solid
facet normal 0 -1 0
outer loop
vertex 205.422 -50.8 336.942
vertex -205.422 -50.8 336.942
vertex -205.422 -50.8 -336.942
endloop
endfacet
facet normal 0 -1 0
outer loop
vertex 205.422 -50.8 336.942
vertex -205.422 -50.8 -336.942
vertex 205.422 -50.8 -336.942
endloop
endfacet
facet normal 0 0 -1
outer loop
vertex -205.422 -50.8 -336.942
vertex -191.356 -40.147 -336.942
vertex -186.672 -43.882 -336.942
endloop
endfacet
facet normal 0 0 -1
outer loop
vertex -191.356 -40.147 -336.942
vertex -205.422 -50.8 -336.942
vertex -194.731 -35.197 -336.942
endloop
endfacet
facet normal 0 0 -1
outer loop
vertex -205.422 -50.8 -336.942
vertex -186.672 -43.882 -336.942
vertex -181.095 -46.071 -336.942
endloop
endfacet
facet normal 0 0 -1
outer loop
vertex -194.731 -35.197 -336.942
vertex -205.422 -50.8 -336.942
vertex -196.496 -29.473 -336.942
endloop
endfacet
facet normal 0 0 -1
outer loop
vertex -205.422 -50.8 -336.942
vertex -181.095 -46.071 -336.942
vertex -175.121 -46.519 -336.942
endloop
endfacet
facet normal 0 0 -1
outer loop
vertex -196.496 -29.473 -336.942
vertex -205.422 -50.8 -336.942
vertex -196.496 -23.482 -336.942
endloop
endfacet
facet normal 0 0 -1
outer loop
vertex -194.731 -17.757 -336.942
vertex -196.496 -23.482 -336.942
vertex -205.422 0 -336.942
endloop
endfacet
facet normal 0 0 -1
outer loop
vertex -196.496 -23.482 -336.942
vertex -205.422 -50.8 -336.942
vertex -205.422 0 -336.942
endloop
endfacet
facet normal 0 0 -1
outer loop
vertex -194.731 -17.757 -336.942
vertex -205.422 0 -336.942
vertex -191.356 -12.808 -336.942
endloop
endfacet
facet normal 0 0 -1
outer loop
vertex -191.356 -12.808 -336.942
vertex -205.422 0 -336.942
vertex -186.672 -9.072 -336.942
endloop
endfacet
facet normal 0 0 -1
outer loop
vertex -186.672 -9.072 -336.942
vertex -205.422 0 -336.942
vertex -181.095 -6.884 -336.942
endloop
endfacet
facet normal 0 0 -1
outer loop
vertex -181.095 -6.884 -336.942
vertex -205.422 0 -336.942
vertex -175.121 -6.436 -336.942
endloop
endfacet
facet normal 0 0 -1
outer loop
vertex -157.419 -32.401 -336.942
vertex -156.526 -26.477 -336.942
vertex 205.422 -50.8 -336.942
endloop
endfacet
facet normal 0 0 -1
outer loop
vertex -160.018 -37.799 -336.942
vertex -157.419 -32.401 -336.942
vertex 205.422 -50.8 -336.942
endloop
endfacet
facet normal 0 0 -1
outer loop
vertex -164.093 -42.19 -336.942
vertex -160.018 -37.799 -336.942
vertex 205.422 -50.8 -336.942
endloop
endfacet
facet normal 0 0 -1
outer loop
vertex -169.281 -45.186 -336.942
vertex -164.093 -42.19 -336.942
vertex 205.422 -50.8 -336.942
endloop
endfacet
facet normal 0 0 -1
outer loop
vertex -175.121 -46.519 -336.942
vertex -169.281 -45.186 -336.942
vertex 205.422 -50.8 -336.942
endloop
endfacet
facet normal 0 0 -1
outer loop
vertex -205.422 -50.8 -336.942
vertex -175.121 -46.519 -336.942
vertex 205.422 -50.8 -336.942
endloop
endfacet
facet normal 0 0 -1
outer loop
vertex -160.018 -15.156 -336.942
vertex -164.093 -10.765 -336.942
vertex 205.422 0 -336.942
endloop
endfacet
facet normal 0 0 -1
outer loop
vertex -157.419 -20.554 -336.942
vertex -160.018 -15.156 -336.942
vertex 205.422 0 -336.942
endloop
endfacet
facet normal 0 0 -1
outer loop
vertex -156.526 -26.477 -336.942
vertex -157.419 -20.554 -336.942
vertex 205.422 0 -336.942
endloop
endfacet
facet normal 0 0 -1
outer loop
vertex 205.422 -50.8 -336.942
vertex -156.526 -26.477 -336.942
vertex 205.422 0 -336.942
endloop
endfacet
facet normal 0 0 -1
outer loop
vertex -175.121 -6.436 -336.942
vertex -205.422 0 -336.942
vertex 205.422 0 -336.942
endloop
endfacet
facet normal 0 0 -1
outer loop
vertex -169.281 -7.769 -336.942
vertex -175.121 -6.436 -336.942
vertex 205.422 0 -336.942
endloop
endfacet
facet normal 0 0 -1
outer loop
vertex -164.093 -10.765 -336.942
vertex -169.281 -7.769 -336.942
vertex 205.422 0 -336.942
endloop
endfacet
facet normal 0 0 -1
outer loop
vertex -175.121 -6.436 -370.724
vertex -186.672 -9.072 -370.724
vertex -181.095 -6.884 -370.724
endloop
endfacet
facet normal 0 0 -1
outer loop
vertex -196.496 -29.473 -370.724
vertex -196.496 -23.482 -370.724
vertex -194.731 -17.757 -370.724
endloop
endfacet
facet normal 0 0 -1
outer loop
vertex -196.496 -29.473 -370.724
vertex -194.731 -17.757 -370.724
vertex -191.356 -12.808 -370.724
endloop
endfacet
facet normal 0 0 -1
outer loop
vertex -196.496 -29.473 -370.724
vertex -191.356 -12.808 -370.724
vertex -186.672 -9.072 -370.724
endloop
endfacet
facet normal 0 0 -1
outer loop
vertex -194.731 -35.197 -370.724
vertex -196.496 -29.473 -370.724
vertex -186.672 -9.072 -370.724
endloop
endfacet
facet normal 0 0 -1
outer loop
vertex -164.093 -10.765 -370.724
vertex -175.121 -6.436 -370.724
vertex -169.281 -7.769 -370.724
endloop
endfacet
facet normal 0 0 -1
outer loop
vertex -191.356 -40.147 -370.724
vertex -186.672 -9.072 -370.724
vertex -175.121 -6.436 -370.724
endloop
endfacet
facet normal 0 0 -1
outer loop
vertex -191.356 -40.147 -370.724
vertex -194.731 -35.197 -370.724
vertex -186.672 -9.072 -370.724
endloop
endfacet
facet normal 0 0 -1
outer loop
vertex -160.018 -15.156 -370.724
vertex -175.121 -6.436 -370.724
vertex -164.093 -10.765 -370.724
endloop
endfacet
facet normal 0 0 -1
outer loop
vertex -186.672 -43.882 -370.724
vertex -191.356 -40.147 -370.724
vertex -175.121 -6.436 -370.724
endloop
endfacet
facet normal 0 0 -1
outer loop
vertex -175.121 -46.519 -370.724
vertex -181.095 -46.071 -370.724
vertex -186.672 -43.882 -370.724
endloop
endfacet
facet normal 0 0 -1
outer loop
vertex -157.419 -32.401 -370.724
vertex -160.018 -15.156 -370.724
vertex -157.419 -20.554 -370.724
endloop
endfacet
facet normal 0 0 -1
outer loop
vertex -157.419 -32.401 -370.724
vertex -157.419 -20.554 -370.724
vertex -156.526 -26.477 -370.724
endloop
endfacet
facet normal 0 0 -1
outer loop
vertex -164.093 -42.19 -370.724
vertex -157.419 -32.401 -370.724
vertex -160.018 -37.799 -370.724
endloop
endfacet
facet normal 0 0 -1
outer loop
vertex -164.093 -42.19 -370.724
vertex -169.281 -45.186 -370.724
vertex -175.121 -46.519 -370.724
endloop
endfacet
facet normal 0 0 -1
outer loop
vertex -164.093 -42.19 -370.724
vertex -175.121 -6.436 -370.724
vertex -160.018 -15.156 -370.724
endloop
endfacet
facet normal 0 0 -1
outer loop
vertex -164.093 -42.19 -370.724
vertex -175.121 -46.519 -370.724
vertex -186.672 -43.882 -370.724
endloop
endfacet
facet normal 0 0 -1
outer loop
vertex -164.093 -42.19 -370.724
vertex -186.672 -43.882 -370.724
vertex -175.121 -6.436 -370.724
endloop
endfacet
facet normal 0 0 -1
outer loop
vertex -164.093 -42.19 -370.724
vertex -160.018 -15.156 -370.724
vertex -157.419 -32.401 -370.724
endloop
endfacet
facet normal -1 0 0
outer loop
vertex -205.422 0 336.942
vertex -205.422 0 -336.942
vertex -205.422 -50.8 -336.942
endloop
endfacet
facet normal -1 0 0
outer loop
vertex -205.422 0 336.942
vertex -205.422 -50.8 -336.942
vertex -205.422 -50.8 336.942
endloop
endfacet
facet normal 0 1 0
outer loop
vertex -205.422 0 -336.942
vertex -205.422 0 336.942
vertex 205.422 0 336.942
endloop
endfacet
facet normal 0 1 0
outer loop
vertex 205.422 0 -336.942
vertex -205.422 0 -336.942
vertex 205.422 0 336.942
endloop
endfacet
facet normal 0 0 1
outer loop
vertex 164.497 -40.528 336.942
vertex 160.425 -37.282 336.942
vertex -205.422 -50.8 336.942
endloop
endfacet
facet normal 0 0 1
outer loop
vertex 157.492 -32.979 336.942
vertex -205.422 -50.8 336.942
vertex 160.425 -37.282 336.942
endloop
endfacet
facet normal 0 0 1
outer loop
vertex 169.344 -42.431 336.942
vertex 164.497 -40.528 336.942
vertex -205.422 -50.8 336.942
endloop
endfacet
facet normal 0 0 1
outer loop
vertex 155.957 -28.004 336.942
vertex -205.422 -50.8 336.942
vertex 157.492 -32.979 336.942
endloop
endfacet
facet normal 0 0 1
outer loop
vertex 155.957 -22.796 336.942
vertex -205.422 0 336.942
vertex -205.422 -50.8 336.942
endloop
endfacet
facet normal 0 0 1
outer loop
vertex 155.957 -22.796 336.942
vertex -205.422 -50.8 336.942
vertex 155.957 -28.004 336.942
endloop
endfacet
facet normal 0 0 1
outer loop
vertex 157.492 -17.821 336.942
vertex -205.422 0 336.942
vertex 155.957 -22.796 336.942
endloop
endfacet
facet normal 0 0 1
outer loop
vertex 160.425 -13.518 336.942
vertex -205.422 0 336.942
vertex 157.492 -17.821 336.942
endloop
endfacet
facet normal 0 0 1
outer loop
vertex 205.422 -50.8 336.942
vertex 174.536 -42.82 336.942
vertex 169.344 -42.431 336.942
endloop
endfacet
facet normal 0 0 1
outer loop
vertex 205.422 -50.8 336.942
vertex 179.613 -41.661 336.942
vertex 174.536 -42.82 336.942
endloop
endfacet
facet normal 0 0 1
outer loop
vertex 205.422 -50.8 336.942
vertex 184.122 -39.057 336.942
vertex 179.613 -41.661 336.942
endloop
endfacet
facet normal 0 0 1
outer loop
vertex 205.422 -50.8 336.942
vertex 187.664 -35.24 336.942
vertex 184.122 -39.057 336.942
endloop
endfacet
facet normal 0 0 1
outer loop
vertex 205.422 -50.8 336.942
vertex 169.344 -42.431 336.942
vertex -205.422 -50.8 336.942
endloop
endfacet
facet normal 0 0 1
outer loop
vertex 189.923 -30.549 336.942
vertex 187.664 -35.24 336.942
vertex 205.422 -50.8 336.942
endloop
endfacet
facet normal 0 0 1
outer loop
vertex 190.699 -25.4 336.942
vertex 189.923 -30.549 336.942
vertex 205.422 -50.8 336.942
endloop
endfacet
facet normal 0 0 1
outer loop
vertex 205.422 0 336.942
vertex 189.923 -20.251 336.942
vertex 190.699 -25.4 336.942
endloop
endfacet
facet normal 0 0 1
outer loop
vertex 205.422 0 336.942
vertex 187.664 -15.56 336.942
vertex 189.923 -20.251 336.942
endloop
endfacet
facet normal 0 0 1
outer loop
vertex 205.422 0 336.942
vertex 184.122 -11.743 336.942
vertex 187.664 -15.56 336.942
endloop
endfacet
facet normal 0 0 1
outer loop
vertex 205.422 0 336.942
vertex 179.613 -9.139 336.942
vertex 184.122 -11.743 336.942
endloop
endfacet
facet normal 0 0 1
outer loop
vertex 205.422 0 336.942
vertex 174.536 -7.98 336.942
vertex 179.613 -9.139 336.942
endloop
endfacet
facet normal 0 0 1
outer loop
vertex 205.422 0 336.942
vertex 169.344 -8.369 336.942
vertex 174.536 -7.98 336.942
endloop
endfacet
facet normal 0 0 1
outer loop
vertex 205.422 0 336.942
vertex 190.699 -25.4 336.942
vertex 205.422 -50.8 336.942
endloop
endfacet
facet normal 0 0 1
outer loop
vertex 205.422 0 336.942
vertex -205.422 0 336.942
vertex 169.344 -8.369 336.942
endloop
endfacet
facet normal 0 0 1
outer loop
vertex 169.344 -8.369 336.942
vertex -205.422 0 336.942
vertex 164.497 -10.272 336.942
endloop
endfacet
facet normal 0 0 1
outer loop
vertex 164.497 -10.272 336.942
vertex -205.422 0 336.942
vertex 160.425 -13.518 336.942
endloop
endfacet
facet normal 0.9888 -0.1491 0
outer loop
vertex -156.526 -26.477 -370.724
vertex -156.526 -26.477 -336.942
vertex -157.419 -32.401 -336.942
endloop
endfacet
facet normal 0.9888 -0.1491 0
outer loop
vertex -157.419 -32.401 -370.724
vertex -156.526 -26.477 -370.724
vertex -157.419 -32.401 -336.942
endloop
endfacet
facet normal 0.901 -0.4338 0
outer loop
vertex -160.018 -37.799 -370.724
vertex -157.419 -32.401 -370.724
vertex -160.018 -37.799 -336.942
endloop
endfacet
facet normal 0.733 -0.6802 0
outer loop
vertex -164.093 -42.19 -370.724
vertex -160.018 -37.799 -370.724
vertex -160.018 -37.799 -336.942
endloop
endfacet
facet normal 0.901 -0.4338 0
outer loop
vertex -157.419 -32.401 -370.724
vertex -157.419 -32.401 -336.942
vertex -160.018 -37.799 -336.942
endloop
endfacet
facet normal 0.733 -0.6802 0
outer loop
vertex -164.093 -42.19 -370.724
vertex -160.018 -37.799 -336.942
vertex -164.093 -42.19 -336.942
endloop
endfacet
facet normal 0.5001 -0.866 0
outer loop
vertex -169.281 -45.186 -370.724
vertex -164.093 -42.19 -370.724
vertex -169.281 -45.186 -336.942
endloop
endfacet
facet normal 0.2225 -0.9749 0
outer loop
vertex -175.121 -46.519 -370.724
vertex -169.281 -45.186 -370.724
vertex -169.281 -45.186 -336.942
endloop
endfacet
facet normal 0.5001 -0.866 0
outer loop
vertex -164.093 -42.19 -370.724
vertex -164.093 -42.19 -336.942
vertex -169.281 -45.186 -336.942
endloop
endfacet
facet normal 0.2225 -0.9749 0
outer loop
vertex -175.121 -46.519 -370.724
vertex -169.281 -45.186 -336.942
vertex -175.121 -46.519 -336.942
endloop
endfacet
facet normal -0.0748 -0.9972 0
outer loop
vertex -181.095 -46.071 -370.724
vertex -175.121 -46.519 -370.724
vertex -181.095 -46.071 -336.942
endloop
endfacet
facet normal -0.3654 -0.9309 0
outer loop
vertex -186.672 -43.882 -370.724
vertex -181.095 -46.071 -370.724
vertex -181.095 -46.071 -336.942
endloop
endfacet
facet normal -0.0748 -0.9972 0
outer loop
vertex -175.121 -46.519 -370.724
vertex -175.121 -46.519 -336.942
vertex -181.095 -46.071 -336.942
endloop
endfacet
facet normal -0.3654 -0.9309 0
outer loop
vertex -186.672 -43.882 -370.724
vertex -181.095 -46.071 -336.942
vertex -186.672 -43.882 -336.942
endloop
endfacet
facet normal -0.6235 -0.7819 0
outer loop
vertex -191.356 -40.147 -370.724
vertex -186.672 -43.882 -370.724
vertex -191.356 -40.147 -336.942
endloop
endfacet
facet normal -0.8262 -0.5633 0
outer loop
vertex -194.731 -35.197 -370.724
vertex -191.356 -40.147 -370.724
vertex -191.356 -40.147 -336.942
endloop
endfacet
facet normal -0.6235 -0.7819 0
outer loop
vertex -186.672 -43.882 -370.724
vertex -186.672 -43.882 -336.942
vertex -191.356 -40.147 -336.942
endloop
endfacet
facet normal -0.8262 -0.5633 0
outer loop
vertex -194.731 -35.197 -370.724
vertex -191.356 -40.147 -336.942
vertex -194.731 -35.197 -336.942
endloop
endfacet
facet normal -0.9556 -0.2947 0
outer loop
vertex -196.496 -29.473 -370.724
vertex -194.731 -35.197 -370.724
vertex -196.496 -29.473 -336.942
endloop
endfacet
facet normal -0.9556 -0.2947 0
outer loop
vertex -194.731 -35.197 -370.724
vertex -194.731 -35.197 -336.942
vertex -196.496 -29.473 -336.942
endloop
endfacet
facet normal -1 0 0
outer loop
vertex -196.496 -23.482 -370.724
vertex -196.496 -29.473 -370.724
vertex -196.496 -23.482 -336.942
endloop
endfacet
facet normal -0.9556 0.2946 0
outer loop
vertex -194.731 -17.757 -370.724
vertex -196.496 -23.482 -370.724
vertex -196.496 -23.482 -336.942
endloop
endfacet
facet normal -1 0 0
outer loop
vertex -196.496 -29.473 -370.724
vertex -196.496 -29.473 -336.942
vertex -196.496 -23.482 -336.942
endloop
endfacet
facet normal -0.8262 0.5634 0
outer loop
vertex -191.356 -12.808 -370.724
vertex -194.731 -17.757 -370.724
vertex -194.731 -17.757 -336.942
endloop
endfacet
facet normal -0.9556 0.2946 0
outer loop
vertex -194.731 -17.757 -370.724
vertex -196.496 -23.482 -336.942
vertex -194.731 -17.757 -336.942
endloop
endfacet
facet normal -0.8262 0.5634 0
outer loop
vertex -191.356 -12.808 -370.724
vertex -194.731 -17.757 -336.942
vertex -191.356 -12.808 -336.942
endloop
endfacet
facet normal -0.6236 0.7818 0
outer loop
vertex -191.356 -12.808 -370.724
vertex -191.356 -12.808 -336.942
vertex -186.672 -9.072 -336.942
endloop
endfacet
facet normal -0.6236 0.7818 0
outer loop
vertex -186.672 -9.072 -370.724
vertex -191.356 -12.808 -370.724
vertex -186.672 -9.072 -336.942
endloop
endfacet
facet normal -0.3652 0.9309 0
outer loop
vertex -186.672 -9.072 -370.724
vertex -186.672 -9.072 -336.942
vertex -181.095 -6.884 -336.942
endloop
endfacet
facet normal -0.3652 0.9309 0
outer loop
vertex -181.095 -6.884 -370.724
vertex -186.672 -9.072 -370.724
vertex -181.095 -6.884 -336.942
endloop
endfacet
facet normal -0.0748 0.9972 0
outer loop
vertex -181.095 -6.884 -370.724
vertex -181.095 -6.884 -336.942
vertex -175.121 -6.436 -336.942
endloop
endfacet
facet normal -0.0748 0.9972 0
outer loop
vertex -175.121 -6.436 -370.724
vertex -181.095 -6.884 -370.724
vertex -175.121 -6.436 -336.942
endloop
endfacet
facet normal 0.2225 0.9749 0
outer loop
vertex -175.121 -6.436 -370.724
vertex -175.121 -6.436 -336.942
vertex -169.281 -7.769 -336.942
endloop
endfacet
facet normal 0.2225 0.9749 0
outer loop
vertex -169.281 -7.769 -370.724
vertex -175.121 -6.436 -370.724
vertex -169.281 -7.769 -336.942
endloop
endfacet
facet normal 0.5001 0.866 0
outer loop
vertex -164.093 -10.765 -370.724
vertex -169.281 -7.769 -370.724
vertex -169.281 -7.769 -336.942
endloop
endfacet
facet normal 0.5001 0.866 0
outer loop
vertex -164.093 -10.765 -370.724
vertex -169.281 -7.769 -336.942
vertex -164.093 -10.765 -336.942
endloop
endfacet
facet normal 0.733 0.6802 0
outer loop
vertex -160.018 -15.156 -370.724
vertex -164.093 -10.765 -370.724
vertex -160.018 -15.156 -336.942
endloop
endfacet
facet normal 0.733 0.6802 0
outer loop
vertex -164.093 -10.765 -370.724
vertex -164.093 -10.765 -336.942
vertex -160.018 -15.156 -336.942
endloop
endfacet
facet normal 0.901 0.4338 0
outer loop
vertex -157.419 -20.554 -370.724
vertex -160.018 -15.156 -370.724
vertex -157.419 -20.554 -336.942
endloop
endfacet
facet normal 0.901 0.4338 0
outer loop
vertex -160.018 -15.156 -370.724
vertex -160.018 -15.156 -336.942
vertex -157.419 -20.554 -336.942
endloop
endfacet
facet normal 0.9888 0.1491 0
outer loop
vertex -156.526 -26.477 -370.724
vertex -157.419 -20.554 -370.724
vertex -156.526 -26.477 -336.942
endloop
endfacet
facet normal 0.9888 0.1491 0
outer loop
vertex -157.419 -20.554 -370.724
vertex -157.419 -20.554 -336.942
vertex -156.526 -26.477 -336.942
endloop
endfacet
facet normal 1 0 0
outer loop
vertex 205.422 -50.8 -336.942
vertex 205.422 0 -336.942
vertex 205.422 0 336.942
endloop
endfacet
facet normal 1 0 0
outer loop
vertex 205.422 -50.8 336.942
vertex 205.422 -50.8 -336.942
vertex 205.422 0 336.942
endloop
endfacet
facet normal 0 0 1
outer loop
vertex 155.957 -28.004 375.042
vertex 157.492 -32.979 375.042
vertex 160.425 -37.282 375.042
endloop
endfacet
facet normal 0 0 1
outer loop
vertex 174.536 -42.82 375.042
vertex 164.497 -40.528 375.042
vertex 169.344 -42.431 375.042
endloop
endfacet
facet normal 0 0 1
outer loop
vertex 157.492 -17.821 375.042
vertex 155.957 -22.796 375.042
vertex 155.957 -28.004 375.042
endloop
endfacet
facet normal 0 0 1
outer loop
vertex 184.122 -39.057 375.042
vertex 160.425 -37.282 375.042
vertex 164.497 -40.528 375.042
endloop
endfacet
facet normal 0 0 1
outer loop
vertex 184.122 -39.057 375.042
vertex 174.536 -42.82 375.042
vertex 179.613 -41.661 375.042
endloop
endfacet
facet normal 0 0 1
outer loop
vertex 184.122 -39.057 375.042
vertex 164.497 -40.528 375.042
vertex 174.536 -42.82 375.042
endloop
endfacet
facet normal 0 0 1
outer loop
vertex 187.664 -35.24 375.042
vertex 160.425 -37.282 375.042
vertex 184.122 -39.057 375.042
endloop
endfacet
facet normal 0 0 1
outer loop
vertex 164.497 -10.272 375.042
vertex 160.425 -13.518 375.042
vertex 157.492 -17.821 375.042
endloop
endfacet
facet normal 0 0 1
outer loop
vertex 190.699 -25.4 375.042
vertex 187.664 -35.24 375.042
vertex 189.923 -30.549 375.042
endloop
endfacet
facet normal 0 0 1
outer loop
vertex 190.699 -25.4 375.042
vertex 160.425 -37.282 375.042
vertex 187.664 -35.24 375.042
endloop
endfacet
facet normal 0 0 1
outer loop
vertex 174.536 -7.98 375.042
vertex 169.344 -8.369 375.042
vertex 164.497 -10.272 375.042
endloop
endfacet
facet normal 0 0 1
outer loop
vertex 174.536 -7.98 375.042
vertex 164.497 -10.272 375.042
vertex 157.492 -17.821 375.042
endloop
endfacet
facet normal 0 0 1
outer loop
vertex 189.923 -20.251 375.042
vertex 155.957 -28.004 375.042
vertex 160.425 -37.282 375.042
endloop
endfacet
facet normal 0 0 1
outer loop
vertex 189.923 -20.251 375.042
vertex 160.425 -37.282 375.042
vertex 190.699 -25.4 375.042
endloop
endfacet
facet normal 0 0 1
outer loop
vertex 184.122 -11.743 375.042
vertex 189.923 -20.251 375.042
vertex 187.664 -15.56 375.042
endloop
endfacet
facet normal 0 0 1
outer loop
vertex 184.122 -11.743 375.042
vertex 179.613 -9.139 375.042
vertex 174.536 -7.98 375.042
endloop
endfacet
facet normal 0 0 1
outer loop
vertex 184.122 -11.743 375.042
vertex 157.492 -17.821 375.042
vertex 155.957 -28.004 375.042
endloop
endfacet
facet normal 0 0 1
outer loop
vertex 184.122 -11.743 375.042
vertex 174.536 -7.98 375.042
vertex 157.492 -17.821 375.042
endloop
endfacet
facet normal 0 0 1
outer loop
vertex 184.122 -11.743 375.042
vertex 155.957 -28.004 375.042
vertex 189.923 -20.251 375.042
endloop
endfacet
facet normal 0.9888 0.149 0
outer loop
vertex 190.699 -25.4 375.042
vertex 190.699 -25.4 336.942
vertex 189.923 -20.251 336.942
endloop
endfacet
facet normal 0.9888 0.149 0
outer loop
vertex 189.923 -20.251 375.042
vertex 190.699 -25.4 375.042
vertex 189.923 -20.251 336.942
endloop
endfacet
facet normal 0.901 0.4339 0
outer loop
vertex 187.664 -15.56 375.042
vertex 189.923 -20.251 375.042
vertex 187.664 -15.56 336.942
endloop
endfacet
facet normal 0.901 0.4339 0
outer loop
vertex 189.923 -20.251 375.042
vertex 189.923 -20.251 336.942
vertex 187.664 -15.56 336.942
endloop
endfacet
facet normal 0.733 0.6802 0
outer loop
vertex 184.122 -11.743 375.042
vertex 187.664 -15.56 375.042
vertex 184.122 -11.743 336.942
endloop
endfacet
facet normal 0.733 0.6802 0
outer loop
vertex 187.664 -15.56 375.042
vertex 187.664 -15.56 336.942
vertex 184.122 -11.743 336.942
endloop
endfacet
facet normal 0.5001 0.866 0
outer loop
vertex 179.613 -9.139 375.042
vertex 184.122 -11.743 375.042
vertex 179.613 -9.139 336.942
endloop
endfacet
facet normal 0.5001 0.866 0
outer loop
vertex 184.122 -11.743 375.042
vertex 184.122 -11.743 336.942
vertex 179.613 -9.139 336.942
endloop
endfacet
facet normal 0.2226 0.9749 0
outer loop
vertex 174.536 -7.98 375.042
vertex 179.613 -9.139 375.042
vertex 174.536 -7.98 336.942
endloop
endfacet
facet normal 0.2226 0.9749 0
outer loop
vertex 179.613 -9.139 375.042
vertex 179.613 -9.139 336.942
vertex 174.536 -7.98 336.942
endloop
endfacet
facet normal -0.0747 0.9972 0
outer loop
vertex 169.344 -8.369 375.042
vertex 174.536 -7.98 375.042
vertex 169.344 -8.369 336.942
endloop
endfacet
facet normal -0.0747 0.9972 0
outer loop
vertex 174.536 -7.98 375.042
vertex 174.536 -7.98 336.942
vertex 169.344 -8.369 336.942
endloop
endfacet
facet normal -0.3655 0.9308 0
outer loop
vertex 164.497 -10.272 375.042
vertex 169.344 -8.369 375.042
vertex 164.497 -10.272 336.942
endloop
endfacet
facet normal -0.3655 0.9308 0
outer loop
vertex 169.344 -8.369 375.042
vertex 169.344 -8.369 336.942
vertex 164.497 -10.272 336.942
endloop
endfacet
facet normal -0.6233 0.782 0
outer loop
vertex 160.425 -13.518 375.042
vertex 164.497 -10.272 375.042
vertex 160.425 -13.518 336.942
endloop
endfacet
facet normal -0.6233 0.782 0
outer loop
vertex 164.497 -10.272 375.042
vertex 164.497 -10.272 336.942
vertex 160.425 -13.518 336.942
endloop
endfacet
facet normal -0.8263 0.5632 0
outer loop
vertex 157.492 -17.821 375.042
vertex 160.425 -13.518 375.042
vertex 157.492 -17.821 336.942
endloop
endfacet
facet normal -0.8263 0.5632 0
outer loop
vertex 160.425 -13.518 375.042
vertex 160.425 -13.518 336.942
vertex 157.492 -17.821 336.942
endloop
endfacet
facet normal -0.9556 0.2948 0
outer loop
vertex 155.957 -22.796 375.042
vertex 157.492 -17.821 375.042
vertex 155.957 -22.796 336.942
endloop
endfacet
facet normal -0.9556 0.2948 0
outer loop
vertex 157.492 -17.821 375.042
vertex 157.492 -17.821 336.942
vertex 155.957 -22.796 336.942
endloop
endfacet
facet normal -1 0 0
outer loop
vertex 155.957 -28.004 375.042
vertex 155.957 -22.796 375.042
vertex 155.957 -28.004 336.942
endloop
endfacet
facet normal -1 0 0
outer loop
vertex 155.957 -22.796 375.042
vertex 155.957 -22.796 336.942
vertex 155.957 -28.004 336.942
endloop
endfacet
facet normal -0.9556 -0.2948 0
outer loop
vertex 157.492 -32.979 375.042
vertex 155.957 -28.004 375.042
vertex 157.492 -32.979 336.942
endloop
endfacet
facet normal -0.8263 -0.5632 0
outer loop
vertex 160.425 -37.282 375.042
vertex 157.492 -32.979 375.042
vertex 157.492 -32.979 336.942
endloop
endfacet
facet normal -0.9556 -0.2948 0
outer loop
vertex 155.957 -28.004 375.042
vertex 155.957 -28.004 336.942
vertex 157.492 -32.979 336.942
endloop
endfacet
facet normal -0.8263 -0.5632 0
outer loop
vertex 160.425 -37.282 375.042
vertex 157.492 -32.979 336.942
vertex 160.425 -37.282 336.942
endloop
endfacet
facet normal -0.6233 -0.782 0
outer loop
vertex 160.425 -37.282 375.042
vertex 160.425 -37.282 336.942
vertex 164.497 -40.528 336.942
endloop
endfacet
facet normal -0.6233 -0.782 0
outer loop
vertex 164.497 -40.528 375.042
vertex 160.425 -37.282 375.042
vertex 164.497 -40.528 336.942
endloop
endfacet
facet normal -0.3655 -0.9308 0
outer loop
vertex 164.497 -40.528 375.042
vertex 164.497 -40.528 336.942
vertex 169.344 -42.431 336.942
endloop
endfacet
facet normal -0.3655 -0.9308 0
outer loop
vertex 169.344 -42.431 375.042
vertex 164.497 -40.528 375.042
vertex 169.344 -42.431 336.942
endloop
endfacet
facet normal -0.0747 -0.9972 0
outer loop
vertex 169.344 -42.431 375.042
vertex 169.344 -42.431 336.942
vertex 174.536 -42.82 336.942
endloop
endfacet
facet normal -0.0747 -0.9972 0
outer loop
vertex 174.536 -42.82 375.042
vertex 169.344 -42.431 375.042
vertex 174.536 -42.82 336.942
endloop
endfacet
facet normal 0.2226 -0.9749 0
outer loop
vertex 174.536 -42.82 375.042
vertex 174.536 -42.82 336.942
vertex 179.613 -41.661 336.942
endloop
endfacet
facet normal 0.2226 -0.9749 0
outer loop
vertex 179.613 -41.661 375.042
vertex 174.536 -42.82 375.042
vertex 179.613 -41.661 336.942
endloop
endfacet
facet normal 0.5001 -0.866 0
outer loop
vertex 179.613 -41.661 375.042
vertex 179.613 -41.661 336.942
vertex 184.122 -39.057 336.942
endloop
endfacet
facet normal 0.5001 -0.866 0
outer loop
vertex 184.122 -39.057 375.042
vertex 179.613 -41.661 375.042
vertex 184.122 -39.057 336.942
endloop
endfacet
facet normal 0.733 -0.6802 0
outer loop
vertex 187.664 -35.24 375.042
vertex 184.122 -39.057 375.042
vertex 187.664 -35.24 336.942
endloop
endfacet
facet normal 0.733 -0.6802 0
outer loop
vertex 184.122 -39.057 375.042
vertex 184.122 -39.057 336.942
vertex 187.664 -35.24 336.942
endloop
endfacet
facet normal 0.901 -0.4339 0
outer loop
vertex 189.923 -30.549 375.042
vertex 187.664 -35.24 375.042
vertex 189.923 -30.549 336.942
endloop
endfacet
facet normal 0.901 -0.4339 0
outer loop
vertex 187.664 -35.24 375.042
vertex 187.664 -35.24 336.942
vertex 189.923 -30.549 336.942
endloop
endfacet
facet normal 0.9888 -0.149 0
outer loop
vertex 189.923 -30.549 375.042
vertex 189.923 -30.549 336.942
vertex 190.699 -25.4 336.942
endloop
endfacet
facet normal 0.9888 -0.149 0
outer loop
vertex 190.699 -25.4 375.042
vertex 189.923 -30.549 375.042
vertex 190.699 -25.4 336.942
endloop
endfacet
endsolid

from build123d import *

# Parameters (mm, degrees)
F0_W     = 410.845
F0_H     = 673.883108
F1_DEPTH = 50.8
F2_R     = 20.097435
F3_DEPTH = 33.782
F4_R     = 17.468499
F5_DEPTH = 38.1


with BuildPart() as f1:
    # F0 (on Front) → F1 (new body)
    with BuildSketch(Plane.XZ):
        Rectangle(F0_W, F0_H)
    extrude(amount=F1_DEPTH)

    # F2 (on face) → F3 (join)
    with BuildSketch(Plane(origin=(0, 0, -336.941554), x_dir=(1, 0, 0), z_dir=(0, 0, -1))):
        with Locations((-176.623374, 26.477363)):
            Circle(F2_R)
    extrude(amount=F3_DEPTH)

    # F4 (on face) → F5 (join)
    with BuildSketch(Plane.XY.offset(336.941554)):
        with Locations((173.230782, -25.4)):
            Circle(F4_R)
    extrude(amount=F5_DEPTH)


solid = f1.part
